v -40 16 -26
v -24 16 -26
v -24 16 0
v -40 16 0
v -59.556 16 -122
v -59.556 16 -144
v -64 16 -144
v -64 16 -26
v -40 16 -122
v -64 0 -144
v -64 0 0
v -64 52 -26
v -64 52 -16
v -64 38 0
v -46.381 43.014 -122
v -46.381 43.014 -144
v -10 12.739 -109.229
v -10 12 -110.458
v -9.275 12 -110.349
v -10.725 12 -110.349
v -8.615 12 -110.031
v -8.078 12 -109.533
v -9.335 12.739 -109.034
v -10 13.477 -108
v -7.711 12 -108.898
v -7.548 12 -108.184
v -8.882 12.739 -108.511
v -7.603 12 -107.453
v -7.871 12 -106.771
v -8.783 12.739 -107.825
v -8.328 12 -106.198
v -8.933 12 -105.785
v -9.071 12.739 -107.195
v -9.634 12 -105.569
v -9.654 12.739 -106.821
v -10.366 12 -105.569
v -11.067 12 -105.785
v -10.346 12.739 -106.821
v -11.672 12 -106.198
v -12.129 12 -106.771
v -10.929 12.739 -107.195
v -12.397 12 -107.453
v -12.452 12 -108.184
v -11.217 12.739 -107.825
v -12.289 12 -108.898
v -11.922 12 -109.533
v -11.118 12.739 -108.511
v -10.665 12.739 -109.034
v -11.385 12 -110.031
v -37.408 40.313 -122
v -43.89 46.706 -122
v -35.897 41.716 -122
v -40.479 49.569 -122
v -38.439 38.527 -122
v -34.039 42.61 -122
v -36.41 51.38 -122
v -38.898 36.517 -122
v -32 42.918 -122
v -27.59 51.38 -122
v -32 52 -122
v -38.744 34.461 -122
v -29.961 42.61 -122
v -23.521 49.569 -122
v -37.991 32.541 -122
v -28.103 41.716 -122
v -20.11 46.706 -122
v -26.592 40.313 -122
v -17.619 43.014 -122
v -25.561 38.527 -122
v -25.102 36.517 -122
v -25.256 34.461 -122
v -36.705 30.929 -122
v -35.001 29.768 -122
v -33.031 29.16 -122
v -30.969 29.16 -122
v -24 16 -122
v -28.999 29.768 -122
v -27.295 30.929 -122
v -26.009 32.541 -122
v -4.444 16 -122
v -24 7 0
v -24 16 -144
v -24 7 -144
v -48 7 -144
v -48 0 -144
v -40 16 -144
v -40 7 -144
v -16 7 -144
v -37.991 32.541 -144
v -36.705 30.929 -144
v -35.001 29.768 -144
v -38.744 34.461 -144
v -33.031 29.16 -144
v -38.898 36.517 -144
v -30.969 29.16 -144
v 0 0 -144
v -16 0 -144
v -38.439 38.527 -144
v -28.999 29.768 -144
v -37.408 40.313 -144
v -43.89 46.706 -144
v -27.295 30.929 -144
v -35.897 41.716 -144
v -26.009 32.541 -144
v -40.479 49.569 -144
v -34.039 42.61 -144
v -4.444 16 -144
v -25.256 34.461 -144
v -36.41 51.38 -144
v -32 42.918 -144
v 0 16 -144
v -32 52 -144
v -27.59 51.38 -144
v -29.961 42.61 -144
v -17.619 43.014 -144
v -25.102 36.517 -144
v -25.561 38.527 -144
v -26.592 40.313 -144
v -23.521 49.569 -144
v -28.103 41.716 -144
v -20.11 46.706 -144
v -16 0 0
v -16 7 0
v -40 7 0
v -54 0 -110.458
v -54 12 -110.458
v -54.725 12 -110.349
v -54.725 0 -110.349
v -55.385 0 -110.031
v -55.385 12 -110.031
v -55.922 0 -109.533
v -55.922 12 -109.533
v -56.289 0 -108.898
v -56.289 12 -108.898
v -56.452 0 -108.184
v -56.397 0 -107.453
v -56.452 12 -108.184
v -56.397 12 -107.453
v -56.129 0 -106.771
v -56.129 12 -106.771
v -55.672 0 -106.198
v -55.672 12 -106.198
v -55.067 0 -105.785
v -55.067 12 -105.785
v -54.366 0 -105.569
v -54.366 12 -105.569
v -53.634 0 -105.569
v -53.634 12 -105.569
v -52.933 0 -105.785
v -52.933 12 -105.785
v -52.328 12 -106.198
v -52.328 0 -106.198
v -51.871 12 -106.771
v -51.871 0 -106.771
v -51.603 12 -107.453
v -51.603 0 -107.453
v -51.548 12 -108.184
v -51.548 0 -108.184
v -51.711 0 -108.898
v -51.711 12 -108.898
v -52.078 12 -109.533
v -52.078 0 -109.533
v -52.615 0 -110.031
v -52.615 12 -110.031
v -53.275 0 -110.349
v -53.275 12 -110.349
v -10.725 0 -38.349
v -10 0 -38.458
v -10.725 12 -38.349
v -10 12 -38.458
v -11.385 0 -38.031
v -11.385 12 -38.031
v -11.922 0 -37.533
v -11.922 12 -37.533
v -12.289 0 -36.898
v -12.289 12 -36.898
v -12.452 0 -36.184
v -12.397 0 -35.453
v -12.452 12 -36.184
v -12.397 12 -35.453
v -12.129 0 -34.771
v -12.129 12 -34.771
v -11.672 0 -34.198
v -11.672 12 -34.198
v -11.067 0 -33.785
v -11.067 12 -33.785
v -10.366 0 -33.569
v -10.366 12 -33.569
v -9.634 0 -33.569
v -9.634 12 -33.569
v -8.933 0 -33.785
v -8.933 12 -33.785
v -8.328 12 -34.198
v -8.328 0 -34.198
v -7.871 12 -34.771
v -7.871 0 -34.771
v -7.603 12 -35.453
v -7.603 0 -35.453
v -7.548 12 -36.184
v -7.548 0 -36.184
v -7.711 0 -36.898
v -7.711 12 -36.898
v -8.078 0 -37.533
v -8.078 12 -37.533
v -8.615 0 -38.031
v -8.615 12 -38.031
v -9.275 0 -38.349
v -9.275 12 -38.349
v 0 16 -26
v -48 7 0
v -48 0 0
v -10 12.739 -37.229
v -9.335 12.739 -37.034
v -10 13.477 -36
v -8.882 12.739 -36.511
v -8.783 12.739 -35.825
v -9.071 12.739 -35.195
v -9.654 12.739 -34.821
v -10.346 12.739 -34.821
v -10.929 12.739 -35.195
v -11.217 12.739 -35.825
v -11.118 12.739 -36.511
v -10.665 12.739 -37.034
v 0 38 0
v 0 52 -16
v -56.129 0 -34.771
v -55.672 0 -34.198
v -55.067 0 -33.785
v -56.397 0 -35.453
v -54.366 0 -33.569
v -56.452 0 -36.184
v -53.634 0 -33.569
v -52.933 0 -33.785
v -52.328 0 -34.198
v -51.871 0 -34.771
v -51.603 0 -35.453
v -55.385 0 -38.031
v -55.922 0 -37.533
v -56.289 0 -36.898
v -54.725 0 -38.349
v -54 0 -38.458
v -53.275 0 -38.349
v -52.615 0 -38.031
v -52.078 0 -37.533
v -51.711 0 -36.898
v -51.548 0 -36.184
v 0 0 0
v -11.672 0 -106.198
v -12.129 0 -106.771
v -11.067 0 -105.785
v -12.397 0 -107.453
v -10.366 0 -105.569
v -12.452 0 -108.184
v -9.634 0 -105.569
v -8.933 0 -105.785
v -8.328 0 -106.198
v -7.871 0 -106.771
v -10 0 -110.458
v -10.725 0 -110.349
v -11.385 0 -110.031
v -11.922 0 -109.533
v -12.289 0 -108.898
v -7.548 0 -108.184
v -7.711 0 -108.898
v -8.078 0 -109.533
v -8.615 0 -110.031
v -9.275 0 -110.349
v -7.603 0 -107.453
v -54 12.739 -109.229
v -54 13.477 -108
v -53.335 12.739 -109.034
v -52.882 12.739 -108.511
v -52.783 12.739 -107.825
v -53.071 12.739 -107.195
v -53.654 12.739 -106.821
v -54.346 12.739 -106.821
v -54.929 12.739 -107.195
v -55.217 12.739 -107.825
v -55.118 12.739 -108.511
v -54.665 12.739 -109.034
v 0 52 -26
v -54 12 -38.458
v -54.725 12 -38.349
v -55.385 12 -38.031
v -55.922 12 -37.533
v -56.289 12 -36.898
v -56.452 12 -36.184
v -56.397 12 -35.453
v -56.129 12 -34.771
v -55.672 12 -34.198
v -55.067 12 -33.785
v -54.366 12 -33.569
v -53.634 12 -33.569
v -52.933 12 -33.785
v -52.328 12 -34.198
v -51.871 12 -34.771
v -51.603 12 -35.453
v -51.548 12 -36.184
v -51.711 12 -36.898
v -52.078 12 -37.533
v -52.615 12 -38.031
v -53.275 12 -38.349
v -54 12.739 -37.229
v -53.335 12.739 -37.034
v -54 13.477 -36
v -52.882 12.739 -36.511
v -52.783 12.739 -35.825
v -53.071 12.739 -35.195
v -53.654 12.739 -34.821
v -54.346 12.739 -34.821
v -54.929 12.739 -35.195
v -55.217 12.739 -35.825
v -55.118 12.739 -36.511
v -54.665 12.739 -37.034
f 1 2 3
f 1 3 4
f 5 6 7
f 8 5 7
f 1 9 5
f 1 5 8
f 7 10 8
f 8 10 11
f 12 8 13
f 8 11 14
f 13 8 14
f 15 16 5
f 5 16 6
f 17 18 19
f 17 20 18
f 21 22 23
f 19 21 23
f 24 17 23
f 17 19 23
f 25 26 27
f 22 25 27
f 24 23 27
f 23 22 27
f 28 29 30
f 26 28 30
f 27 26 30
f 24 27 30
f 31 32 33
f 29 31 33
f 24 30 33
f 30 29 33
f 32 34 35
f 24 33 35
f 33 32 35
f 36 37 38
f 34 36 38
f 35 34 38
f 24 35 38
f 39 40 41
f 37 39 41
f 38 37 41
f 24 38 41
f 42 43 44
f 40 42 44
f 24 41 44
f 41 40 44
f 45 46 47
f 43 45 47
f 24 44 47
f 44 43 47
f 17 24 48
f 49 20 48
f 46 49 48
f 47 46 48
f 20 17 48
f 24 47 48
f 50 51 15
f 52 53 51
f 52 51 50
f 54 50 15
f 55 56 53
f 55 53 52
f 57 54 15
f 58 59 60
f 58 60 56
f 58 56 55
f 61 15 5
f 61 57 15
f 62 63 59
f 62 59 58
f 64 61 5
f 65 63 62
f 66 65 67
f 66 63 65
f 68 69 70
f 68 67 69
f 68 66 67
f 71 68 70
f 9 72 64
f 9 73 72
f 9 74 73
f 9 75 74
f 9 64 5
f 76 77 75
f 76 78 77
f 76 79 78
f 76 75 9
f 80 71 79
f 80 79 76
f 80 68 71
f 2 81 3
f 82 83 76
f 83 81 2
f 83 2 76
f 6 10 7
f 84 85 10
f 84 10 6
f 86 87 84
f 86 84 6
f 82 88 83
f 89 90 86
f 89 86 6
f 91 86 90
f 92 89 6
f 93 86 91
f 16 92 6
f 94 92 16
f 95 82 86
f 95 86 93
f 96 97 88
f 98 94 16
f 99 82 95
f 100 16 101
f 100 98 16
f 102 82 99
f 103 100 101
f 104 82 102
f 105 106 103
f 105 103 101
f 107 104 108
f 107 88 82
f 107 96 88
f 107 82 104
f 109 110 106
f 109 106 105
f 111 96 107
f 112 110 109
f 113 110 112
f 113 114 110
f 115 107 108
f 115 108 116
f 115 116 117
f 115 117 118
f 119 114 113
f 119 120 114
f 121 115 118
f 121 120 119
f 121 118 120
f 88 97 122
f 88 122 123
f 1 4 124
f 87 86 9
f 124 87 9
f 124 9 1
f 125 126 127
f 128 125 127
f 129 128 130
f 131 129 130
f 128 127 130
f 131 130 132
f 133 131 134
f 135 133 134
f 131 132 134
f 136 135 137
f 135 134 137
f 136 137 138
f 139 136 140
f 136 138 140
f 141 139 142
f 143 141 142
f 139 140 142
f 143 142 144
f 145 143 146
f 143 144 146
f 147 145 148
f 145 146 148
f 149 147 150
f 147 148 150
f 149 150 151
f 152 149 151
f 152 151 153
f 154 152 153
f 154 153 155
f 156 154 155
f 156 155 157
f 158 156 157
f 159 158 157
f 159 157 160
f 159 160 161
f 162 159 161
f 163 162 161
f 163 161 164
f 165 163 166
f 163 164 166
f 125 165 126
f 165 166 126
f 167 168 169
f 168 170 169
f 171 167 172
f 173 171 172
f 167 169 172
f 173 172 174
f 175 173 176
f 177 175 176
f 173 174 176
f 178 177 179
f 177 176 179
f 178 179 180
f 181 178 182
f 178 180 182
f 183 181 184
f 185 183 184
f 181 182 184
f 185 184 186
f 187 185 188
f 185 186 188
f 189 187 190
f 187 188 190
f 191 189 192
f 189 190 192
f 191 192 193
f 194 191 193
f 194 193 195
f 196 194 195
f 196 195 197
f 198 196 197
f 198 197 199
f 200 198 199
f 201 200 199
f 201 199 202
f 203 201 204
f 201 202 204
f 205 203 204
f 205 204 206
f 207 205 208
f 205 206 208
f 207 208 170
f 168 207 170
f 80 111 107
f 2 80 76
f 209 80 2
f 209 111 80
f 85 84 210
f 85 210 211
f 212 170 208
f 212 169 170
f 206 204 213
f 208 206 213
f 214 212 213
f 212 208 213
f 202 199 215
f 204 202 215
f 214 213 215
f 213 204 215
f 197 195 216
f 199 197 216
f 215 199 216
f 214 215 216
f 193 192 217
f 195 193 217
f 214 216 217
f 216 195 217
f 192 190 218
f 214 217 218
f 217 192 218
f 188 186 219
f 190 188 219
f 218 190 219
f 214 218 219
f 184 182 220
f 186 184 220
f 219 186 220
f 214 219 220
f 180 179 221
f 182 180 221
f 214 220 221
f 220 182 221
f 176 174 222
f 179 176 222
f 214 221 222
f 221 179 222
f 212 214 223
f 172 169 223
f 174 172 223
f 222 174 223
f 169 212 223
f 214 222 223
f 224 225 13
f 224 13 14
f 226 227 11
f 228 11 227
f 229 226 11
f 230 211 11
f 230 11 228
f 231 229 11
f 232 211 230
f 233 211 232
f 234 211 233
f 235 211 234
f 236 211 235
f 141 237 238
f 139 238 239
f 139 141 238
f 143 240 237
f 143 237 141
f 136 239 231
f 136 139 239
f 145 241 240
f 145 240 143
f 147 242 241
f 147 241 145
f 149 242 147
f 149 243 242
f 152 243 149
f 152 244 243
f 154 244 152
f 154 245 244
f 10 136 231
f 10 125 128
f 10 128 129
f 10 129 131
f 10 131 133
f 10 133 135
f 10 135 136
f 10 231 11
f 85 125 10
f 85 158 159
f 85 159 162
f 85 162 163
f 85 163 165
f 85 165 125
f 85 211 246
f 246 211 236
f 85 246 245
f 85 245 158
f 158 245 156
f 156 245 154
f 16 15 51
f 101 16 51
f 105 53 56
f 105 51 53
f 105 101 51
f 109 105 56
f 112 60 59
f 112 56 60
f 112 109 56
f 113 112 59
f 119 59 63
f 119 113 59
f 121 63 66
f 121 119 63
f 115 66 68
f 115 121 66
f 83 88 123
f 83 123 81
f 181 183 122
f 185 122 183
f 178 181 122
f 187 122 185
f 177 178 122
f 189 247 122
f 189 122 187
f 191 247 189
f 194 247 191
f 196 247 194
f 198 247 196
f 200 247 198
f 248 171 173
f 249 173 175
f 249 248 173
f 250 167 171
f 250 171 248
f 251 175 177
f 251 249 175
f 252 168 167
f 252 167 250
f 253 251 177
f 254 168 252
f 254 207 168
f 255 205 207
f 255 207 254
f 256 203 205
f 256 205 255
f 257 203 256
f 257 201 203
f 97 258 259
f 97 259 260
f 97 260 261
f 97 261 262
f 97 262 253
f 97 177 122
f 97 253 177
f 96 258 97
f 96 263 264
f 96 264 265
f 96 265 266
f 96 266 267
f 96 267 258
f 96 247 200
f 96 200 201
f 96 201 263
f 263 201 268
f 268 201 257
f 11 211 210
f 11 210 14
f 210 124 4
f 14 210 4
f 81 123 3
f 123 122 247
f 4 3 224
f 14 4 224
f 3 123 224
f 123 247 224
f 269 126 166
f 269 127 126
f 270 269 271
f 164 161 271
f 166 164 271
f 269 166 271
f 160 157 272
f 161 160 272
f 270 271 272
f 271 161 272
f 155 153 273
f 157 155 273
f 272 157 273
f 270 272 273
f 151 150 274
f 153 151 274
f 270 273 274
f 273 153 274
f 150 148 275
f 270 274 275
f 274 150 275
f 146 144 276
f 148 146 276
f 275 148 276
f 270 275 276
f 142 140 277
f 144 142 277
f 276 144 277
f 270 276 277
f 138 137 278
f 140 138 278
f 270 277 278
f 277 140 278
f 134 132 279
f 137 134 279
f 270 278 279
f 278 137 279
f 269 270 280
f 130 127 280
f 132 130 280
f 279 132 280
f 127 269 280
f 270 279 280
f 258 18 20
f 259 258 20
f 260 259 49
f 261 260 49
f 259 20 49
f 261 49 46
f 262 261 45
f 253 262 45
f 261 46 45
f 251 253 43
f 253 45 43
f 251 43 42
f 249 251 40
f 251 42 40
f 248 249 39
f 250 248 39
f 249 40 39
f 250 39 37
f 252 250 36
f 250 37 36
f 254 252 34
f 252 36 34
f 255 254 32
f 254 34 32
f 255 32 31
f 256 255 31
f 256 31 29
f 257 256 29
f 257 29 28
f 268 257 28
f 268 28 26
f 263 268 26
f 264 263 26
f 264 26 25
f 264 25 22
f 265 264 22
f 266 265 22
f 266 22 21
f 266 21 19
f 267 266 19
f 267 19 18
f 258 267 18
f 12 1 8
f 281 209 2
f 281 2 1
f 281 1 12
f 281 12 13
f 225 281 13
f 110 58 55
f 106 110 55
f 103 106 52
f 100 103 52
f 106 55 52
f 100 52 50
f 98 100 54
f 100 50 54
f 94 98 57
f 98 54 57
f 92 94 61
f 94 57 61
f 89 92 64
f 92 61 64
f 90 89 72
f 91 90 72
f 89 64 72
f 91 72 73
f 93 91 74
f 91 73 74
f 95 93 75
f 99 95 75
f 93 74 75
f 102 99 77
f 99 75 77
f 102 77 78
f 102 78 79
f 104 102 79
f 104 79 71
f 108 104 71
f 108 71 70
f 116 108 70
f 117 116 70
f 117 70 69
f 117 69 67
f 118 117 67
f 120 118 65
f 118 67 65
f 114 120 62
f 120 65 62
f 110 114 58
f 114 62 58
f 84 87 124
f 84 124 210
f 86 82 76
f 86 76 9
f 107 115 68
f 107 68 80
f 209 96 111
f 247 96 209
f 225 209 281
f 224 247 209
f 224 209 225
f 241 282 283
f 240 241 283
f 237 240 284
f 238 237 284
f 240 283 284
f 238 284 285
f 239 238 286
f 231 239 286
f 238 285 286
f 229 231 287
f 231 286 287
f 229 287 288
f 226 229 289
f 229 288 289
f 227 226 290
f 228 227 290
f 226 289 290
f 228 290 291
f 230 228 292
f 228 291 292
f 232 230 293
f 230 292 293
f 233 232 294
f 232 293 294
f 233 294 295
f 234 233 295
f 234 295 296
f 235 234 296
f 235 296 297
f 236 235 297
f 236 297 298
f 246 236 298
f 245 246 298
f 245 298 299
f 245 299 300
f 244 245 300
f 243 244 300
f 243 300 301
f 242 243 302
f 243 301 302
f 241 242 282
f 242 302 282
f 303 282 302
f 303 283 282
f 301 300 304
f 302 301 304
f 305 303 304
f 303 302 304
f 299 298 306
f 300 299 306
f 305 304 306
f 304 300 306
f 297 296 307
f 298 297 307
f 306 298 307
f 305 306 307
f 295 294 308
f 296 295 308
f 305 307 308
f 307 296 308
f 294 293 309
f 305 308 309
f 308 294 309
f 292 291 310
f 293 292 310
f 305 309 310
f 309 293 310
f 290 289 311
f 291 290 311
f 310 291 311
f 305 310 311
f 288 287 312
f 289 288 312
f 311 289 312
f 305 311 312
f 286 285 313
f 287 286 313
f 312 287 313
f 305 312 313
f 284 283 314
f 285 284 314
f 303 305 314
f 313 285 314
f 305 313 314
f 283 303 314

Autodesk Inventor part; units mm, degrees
ref_plane "YZ Plane" through (0, 0, 0) normal (1, 0, 0) x (0, 1, 0)
ref_plane "XZ Plane" through (0, 0, 0) normal (0, 1, 0) x (-1, 0, 0)
ref_plane "XY Plane" through (0, 0, 0) normal (0, 0, 1) x (1, 0, 0)
sketch "Esboço1" plane through (0, 0, 0) normal (1, 0, 0) x (0, 1, 0)
  line L0 (0, 0) -> (0, -144)
  line L1 (0, -144) -> (52, -144)
  line L2 (52, -144) -> (52, -122)
  line L3 (52, -122) -> (16, -122)
  line L4 (0, 0) -> (38, 0)
  line L5 (38, 0) -> (52, 0)
  line L6 (16, -122) -> (16, -26)
  line L7 (16, -26) -> (52, -26)
  line L8 (52, -26) -> (52, -16)
  line L9 (52, -16) -> (38, 0)
  dimension "d0" = 144
  dimension "d1" = 52
  dimension "d2" = 22
  dimension "d3" = 36
  dimension "d8" = 38
  dimension "d10" = 96
  dimension "d12" = 10
extrude "Extrusão1" add sketch "Esboço1" against normal blind 64
sketch "Esboço2" plane through (0, 0, -144) normal (0, 0, -1) x (-1, 0, 0)
  line L0 (0, 0) -> (16, 0)
  line L1 (0, 0) -> (64, 0) projected
  line L2 (16, 0) -> (16, 7)
  line L3 (16, 7) -> (24, 7)
  line L4 (24, 7) -> (24, 16)
  line L5 (24, 16) -> (40, 16)
  line L6 (0, 16) -> (64, 16) projected
  line L7 (40, 16) -> (40, 7)
  line L8 (40, 7) -> (48, 7)
  line L9 (48, 7) -> (48, 0)
  dimension "d15" = 16
  dimension "d16" = 7
  dimension "d20" = 16
  dimension "d21" = 9
  dimension "d22" = 8
extrude "Extrusão2" cut sketch "Esboço2" against normal blind 144
sketch "Esboço3" plane through (0, 0, -144) normal (0, 0, -1) x (-1, 0, 0)
  point P0 (0, 0)
sketch "Esboço5" plane through (0, 0, -144) normal (0, 0, -1) x (-1, 0, 0)
  line L0 (48, 0) -> (64, 0) projected
  line L1 (0, 52) -> (64, 52) projected
  line L2 (64, 52) -> (64, 0) projected
  line L3 (40, 16) -> (64, 16) projected
  line L4 (24, 16) -> (40, 16) projected
  circle A0 centre (32, 36) radius 16
  line L5 (46.3807, 43.0139) -> (59.5563, 16)
  line L6 (17.6193, 43.0139) -> (4.4437, 16)
  line L7 (0, 0) -> (0, 52) projected
  line L8 (0, 0) -> (0, 16)
  line L9 (0, 16) -> (4.4437, 16)
  line L10 (0, 16) -> (24, 16) projected
  line L11 (59.5563, 16) -> (64, 16)
  line L12 (64, 16) -> (64, 0)
  point P0 (32, 52)
extrude "Extrusão3" cut sketch "Esboço5" against normal blind 22 contours L1 A0 L6 L9 L7 | L1 L2 L3 L5 A0
sketch "Esboço6" plane through (0, 0, -144) normal (0, 0, -1) x (-1, 0, 0)
  line L0 (24, 16) -> (40, 16) projected
  line L1 (32, 16) -> (32, 36)
  point P0 (0, 0)
  dimension "d49" = 20
hole "Furo1" at (-32, 36, -144) direction (0, 0, 1) diameter 13.835 depth 22 thread size "M16x2" class "6H" standard "ISO Metric profile"
sketch "Esboço7" plane through (-64, 0, -144) normal (0, -1, 0) x (1, 0, 0)
  line L0 (0, 144) -> (0, 128) projected
  line L1 (10, 108) -> (10, 36)
  line L2 (54, 108) -> (54, 36)
  point P0 (64, 144)
  dimension "d59" = 72
  dimension "d61" = 72
hole "Furo2" at (-10, 0, -36) at (-10, 0, -108) at (-54, 0, -108) at (-54, 0, -36) direction (0, 1, 0) diameter 4.917 depth 12 tip angle 118 thread size "M6x1" class "6H" standard "ISO Metric profile"
properties part number "morsa_body" material "Iron, Cast"
